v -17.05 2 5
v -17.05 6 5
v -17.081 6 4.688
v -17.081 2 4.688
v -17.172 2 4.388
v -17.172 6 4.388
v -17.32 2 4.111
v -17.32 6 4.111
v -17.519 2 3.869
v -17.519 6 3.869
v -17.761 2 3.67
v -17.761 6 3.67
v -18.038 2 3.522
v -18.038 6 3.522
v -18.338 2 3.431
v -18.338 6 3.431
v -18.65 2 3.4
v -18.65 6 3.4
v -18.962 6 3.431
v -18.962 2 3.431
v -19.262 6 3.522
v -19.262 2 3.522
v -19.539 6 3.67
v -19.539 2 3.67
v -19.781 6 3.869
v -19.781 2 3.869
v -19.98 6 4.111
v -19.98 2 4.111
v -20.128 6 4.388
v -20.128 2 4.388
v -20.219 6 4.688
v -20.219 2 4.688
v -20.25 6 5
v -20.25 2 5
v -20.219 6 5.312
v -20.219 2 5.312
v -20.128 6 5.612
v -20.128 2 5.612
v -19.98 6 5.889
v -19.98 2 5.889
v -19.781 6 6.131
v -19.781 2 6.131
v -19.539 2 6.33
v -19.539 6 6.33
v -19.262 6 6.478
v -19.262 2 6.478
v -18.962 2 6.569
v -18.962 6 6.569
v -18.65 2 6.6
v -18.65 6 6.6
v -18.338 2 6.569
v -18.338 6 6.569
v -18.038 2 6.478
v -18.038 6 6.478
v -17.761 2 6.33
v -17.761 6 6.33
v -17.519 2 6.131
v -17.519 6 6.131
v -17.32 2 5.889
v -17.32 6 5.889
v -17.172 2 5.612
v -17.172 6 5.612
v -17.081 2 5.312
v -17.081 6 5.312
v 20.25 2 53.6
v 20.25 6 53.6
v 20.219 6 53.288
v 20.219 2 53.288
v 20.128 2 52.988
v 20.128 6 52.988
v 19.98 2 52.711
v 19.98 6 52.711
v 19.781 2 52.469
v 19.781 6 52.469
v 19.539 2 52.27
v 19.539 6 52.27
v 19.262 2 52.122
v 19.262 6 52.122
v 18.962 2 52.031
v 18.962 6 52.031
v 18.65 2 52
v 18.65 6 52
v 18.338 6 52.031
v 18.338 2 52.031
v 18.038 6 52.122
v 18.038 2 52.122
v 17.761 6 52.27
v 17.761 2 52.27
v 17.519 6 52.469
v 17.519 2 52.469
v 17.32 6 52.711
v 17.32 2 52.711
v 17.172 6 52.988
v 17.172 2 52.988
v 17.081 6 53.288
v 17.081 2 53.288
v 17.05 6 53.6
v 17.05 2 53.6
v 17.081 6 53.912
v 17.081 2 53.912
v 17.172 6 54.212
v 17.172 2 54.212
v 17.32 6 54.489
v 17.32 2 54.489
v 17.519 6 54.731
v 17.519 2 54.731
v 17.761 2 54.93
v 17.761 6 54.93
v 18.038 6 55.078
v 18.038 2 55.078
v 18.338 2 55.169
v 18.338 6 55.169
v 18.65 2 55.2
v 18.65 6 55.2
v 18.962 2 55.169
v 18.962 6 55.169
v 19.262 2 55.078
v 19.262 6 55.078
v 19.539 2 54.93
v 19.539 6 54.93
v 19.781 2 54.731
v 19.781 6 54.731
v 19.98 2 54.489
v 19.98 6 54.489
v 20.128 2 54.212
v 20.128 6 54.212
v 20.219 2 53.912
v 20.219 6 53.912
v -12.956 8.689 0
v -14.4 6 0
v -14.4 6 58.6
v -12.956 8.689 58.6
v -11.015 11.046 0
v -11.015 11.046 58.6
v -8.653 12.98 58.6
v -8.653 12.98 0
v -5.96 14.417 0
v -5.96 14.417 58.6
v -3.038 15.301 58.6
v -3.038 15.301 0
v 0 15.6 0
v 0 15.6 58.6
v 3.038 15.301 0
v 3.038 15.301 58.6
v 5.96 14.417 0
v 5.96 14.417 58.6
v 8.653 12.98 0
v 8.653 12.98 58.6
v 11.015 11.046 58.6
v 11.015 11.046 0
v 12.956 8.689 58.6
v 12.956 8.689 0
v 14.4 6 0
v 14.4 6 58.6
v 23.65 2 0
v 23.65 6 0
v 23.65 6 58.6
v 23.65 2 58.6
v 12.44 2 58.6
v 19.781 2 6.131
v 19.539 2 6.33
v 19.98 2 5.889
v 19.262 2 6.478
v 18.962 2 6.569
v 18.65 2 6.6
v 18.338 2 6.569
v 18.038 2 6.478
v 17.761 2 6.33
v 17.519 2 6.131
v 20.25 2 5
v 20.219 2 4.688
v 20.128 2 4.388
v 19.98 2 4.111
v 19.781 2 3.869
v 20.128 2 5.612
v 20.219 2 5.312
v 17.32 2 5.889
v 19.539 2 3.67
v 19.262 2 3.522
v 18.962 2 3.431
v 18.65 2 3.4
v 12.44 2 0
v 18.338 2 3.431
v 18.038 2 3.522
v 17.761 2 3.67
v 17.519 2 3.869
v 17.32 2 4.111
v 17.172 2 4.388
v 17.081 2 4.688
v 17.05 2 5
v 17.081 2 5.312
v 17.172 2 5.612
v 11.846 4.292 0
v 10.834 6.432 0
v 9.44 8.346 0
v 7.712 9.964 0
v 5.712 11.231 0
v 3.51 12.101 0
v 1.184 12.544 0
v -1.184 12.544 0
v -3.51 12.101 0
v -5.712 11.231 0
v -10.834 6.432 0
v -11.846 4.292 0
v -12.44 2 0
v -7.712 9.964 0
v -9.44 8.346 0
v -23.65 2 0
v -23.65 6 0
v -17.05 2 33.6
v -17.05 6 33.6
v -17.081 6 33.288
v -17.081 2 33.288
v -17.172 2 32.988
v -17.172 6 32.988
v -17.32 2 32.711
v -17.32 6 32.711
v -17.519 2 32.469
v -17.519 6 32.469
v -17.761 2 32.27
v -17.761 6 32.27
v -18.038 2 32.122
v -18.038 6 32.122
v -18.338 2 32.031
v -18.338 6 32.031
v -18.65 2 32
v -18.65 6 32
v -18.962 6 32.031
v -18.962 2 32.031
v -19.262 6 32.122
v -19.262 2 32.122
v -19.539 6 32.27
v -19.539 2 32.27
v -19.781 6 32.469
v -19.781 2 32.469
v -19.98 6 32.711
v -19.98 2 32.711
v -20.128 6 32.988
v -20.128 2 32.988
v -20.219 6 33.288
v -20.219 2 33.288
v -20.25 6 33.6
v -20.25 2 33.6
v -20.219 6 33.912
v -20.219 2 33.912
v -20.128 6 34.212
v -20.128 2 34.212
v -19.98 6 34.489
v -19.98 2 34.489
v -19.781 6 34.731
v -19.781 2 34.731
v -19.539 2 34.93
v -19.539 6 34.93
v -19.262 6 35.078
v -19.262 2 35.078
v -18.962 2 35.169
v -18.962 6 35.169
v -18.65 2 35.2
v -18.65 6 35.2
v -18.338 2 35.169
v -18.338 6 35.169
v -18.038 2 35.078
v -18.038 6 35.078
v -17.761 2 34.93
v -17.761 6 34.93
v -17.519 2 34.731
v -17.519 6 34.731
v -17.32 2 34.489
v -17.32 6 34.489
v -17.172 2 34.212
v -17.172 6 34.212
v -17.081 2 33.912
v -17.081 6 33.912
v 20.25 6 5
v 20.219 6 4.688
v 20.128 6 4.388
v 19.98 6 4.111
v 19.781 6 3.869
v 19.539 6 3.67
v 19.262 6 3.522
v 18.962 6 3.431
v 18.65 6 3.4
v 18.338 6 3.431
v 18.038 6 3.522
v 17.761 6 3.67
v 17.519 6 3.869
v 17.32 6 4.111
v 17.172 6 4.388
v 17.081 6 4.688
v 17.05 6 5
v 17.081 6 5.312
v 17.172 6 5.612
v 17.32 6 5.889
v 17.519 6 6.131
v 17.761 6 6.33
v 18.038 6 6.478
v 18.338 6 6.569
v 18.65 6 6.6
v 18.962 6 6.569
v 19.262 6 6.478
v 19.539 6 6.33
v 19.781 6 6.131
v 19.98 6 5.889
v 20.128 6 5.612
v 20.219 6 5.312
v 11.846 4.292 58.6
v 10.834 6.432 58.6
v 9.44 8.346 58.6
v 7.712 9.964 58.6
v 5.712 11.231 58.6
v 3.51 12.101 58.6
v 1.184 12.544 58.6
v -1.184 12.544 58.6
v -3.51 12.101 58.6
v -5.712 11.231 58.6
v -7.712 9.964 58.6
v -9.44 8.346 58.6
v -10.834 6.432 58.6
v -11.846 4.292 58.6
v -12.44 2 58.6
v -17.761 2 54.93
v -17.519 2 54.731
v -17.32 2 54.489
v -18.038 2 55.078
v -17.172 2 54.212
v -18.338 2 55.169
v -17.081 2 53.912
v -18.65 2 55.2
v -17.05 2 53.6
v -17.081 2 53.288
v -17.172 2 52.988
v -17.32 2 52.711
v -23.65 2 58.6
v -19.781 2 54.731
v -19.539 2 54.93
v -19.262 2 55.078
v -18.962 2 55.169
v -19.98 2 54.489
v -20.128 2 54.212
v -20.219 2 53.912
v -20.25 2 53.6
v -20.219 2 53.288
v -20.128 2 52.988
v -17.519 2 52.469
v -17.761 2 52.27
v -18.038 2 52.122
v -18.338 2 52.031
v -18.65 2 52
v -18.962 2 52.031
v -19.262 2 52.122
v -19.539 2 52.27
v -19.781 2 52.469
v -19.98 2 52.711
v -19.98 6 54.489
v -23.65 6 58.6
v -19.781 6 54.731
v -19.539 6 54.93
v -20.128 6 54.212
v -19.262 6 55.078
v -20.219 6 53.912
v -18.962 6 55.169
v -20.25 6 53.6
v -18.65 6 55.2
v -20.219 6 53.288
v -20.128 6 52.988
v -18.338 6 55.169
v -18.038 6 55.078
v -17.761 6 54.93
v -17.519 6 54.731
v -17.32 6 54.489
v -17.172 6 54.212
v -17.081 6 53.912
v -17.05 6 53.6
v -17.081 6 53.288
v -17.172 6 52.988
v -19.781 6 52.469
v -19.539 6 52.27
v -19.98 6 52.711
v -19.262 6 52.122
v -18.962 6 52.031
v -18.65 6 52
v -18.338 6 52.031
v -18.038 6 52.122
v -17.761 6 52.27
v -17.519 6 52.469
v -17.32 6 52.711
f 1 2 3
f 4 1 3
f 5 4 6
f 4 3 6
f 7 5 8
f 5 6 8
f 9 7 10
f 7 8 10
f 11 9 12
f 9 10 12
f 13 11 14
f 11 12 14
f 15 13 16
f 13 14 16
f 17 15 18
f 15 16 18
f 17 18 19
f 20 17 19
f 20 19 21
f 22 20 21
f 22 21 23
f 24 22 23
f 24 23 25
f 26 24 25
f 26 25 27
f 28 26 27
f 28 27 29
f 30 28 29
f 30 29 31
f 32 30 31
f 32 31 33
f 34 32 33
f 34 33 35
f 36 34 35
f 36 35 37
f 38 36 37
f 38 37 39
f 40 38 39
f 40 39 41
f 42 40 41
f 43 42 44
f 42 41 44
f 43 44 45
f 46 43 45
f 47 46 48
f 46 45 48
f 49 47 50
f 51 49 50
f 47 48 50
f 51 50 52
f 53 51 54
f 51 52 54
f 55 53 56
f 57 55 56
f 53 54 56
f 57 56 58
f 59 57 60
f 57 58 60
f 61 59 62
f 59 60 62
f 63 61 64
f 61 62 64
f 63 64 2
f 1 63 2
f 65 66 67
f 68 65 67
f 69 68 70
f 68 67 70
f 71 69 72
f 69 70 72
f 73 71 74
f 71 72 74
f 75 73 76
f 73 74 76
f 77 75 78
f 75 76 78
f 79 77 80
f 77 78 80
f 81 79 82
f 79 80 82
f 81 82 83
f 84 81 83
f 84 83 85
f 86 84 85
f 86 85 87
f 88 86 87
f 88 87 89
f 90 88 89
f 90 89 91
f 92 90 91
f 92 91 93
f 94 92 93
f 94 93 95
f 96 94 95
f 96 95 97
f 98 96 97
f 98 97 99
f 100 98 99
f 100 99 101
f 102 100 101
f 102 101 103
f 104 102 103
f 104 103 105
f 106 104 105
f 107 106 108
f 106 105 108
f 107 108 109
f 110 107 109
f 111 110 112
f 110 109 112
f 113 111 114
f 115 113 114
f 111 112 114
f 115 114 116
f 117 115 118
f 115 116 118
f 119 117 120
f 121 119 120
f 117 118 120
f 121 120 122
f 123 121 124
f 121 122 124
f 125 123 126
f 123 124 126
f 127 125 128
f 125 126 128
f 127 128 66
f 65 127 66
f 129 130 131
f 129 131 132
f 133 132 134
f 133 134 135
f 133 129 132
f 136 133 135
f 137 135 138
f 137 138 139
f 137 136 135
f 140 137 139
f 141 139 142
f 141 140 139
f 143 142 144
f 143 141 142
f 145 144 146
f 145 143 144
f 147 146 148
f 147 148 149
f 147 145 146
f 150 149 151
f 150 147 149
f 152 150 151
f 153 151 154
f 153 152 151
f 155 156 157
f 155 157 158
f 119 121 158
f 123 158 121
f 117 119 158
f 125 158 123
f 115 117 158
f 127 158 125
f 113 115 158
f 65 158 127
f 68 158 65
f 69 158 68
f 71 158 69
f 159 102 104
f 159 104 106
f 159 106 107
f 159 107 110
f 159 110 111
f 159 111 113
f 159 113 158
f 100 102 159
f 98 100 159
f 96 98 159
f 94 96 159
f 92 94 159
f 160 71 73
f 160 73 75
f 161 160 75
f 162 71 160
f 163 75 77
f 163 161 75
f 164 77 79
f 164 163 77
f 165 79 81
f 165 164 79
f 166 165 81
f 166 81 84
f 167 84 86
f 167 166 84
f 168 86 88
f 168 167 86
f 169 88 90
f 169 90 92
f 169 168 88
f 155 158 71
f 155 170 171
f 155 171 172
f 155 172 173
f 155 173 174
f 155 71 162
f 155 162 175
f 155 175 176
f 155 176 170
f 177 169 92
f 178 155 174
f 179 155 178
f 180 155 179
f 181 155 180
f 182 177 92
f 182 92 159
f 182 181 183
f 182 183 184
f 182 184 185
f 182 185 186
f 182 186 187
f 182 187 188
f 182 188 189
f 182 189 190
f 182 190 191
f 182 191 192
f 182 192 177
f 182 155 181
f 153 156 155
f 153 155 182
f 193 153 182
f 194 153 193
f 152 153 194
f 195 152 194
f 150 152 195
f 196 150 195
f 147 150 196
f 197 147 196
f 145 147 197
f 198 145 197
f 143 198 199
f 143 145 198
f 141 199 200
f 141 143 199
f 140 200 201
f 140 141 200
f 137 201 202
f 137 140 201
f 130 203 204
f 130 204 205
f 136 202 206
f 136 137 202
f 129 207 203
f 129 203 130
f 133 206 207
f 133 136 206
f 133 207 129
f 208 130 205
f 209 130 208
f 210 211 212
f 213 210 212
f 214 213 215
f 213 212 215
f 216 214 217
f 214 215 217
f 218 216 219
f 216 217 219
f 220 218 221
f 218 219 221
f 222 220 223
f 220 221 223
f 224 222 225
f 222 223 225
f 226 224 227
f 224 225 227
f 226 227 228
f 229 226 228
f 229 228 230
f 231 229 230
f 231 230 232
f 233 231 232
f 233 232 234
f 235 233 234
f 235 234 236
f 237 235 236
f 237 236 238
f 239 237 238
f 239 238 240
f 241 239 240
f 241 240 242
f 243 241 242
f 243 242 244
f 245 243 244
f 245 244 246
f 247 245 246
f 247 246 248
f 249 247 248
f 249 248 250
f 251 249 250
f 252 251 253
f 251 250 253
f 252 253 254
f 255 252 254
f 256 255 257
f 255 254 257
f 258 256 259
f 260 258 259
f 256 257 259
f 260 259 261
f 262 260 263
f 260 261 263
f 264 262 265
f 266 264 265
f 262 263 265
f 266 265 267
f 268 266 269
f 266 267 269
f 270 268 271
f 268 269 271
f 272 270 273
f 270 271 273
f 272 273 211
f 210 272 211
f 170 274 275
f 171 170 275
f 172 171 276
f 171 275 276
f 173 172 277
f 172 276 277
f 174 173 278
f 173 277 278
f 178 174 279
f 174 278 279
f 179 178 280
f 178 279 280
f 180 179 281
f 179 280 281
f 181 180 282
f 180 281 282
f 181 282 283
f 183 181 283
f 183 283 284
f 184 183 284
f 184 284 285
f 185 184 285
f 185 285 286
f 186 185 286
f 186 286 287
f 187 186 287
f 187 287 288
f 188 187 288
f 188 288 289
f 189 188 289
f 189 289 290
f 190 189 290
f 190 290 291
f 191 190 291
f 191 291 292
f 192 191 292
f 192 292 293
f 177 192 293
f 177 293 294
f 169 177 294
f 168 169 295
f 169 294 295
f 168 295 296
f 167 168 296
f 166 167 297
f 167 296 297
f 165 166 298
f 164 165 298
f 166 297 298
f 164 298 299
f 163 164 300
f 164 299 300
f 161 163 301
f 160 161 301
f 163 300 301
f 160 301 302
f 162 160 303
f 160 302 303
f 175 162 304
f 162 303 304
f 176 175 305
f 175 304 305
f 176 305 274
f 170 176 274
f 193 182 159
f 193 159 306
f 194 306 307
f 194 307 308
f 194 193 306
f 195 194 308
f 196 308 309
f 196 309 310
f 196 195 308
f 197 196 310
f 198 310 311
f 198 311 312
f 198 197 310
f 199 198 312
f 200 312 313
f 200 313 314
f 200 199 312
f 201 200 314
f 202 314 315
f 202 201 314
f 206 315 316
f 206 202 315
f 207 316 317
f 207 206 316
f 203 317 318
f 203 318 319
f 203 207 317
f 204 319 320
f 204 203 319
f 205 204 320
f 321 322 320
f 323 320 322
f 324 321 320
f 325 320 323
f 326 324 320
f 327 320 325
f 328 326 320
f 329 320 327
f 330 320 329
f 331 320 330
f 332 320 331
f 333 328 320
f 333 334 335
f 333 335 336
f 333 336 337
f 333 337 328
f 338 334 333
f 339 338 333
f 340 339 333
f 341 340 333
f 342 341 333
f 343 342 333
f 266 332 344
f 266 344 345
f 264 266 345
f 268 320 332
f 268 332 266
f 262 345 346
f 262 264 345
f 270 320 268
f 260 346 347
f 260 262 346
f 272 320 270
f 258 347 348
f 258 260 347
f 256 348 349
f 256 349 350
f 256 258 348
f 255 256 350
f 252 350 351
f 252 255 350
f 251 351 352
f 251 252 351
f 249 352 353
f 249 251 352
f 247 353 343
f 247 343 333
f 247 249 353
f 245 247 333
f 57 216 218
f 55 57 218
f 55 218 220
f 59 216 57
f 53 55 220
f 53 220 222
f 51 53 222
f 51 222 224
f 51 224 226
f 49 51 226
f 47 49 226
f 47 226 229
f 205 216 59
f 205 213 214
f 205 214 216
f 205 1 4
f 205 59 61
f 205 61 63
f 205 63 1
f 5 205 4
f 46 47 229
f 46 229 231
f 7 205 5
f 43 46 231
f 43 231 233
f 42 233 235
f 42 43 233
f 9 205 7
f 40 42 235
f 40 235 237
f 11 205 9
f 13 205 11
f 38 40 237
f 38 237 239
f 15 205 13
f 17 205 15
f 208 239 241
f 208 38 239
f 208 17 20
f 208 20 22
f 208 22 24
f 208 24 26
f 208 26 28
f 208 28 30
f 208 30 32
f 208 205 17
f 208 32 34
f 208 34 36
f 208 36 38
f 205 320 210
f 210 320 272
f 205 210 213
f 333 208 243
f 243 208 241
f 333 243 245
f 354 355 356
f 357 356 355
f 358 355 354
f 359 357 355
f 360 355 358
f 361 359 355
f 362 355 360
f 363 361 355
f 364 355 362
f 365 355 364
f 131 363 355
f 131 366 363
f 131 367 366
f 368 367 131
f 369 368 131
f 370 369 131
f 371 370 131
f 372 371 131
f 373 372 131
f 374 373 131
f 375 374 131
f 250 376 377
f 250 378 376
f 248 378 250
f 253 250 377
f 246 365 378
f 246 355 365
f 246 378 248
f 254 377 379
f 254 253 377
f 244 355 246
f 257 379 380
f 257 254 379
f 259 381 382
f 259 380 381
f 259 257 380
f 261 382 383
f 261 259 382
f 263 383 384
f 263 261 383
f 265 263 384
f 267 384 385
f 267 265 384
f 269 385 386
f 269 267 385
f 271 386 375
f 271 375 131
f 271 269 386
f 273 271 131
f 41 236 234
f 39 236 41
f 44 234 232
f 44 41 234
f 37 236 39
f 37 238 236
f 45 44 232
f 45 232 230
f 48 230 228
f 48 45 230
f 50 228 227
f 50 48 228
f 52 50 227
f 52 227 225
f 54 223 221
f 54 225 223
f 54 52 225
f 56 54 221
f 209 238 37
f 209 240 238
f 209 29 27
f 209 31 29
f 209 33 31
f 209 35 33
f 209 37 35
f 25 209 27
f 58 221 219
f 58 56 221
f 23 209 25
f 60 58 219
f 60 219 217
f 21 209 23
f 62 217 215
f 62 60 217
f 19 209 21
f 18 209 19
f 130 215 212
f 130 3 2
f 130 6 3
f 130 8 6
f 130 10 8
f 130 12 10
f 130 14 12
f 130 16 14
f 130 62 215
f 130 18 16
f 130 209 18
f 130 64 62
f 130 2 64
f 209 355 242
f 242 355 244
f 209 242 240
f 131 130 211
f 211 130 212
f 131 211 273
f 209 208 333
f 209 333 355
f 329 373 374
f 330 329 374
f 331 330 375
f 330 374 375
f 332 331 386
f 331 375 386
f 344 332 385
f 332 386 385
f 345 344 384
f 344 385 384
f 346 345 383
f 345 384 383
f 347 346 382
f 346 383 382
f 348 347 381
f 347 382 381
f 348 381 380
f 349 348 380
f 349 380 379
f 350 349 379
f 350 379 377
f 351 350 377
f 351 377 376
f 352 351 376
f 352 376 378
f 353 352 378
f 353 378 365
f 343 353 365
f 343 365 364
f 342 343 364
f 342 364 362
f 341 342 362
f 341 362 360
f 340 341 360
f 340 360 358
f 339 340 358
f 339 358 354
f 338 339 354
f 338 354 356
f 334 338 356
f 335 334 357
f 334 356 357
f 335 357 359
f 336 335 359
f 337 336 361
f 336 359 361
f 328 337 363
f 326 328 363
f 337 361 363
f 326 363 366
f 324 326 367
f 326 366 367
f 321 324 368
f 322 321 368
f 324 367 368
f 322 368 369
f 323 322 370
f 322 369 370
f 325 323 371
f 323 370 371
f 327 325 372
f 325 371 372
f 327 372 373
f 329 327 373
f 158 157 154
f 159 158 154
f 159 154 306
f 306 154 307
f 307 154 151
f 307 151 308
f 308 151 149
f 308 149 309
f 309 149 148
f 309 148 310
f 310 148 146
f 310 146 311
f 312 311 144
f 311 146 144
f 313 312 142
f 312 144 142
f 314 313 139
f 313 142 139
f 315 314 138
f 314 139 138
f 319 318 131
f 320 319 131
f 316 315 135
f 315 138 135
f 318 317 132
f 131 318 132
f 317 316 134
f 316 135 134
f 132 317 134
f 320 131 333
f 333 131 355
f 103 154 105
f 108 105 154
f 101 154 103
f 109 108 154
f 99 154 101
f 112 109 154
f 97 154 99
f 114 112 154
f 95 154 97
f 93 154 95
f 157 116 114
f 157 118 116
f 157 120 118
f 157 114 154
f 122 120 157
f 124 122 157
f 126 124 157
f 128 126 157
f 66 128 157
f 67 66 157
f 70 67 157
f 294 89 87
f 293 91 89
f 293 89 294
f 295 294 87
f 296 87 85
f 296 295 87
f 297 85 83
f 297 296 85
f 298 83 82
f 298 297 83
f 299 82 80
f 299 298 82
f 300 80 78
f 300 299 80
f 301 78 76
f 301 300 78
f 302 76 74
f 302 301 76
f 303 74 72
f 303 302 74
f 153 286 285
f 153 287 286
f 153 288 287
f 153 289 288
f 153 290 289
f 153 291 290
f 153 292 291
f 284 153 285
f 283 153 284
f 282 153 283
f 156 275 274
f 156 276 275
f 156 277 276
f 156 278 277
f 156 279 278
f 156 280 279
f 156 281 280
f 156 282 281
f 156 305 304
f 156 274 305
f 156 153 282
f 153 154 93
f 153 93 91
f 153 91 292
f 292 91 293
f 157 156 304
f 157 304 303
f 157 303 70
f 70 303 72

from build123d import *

# Parameters (mm, degrees)
BOSS_EXTRUDE1_DEPTH = 58.6
SKETCH2_R           = 1.6
CUT_EXTRUDE1_DEPTH  = 58.6


with BuildPart() as part:
    # Sketch1 → Boss-Extrude1 (new body)
    with BuildSketch(Plane.XY):
        with BuildLine():
            Line((-23.65, 6), (-14.4, 6))
            ThreePointArc((-14.4, 6), (0, 15.6), (14.4, 6))
            Line((14.4, 6), (23.65, 6))
            Line((23.65, 6), (23.65, 2))
            Line((23.65, 2), (12.440257232, 2))
            ThreePointArc((12.440257232, 2), (0, 12.6), (-12.440257232, 2))
            Line((-12.440257232, 2), (-23.65, 2))
            Line((-23.65, 2), (-23.65, 6))
        make_face()
    extrude(amount=BOSS_EXTRUDE1_DEPTH)

    # Sketch2 → Cut-Extrude1 (cut)
    with BuildSketch(Plane(origin=(0, 6, 0), x_dir=(1, 0, 0), z_dir=(0, 1, 0))):
        with Locations((18.65, -5)):
            Circle(SKETCH2_R)
        with Locations((18.65, -53.6)):
            Circle(SKETCH2_R)
        with Locations((-18.65, -53.6)):
            Circle(SKETCH2_R)
        with Locations((-18.65, -5)):
            Circle(SKETCH2_R)
        with Locations((-18.65, -33.6)):
            Circle(SKETCH2_R)
    extrude(amount=-CUT_EXTRUDE1_DEPTH, mode=Mode.SUBTRACT)


solid = part.part
